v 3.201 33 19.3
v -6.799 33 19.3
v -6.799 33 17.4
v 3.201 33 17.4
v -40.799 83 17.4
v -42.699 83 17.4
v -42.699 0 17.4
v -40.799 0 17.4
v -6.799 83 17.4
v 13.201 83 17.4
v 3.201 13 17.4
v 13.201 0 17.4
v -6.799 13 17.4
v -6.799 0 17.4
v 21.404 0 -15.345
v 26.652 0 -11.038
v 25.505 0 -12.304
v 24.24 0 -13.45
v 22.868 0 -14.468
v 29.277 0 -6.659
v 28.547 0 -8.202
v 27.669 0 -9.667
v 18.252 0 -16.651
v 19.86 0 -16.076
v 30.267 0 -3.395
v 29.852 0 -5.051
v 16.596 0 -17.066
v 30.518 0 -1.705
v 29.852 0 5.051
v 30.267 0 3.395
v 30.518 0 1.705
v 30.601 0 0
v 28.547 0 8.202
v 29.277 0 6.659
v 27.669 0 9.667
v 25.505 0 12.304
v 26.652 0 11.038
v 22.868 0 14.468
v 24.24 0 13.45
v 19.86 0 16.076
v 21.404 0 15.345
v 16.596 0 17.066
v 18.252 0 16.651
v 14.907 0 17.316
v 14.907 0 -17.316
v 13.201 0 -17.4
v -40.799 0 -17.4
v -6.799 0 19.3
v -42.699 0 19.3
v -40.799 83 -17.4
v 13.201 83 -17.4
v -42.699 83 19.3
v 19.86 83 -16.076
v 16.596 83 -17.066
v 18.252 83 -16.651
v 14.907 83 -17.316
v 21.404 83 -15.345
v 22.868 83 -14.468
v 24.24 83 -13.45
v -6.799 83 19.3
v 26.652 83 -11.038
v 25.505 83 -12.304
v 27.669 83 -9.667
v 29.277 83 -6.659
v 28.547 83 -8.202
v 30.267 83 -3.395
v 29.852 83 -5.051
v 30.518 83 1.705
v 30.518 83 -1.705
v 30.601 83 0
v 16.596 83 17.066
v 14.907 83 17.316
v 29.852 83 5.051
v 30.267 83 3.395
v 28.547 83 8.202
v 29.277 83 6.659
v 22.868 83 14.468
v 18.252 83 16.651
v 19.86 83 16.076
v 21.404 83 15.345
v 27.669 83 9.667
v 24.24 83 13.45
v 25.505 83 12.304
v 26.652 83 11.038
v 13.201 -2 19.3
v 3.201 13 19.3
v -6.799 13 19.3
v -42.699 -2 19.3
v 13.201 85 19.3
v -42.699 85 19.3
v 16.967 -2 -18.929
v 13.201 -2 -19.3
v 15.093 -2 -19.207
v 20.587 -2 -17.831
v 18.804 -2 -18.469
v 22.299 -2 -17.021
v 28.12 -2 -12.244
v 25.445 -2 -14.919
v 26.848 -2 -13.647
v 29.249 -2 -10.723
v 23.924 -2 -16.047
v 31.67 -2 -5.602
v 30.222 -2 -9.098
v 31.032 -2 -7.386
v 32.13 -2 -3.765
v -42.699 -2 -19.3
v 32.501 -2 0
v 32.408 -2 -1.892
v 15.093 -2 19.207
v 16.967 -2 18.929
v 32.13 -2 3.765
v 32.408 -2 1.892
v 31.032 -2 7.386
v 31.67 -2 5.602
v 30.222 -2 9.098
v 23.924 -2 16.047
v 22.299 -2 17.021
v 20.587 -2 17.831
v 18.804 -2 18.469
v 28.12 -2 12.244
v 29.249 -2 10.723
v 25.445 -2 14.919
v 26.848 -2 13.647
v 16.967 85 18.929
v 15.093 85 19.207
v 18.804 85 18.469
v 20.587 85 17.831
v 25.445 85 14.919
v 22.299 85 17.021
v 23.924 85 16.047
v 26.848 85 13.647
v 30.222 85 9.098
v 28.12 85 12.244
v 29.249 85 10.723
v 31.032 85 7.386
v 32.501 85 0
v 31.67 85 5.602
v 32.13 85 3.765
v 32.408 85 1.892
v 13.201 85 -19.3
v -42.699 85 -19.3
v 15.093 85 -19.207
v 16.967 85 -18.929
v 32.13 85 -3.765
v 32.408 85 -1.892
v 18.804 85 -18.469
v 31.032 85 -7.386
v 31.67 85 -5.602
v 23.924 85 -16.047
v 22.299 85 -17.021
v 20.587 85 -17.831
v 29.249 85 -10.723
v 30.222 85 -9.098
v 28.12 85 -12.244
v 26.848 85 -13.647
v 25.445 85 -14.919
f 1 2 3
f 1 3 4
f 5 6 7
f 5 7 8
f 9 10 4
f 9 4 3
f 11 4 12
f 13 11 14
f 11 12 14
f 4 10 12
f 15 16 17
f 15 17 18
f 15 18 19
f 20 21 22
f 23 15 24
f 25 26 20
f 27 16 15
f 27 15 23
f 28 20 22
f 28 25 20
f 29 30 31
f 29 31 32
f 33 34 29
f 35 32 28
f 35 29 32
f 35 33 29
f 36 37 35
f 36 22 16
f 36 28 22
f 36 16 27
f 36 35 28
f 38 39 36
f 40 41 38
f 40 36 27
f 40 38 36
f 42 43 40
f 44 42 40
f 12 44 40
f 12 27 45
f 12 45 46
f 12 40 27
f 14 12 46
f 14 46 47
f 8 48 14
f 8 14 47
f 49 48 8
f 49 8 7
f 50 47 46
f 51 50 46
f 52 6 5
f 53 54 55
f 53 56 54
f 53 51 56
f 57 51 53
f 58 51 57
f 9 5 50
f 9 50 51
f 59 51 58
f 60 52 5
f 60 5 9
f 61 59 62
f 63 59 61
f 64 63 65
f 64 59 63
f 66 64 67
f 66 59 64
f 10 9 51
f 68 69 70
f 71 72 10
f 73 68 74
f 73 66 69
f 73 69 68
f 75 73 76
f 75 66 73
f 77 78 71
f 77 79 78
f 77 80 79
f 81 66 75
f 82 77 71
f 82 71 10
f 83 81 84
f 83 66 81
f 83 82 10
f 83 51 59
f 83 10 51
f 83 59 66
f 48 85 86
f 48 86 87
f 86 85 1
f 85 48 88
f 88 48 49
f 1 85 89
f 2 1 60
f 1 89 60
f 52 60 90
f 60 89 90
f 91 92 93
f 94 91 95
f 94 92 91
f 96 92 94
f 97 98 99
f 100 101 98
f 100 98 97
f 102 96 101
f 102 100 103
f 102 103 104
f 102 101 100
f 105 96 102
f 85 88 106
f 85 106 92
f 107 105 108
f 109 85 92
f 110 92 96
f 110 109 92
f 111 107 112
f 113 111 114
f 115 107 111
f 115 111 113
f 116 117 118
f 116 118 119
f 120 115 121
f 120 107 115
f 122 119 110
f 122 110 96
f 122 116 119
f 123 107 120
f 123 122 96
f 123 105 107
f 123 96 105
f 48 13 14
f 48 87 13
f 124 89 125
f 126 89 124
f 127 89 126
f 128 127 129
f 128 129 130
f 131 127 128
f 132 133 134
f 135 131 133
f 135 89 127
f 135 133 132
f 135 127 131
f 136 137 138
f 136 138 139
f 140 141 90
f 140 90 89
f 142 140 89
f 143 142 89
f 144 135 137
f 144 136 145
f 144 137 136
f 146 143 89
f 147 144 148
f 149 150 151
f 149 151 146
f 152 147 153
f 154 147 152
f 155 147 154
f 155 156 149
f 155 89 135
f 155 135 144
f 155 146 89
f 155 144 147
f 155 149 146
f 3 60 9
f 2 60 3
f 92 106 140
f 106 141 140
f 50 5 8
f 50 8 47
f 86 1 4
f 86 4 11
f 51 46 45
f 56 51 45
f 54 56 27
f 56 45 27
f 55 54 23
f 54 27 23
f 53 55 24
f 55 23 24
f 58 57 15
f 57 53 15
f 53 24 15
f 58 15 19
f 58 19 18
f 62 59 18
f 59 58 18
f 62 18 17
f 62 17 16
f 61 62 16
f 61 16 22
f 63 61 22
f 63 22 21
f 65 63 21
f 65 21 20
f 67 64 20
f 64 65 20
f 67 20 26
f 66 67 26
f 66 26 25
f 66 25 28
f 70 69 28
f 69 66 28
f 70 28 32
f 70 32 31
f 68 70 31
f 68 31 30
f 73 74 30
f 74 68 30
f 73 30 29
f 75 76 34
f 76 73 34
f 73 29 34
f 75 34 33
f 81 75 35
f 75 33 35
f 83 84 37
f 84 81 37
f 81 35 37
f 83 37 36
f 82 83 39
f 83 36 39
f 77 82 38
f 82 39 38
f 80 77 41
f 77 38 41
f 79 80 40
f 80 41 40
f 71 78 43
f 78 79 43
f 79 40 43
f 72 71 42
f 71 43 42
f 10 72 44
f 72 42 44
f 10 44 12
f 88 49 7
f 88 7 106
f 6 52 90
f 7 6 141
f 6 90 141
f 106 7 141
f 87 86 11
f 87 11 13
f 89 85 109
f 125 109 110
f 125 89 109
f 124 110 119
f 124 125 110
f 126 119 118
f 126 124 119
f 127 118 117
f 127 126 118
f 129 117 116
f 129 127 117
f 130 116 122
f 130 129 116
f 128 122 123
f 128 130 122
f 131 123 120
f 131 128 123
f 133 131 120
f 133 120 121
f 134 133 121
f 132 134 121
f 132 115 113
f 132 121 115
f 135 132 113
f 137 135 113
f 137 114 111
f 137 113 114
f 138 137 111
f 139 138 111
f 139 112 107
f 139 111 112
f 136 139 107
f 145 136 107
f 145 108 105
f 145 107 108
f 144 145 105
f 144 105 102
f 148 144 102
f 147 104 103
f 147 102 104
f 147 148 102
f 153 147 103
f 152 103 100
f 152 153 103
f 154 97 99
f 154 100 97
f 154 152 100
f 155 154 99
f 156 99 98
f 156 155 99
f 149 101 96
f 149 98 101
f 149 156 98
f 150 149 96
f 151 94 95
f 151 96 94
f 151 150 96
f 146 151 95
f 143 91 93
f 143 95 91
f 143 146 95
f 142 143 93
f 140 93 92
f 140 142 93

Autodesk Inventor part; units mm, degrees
ref_plane "YZ Plane" through (0, 0, 0) normal (1, 0, 0) x (0, 1, 0)
sketch "Sketch1" plane through (0, 0, 0) normal (0, 1, 0) x (-1, 0, 0)
  line L0 (40.7987, 17.4) -> (40.7987, -17.4)
  line L1 (40.7987, -17.4) -> (-13.2013, -17.4)
  arc A0 (-13.2013, 17.4) -> (-13.2013, -17.4) centre (-13.2013, 0) ccw
  line L2 (-13.2013, 17.4) -> (40.7987, 17.4)
  line L3 (42.6987, -19.3) -> (42.6987, 19.3)
  line L4 (42.6987, 19.3) -> (-13.2013, 19.3)
  arc A1 (-13.2013, 19.3) -> (-13.2013, -19.3) centre (-13.2013, 0) ccw
  line L5 (-13.2013, -19.3) -> (42.6987, -19.3)
  point P0 (0, 0)
  point P1 (-13.2013, 0)
  point P2 (0, 0)
  point P3 (-12.8411, -36.7096)
  point P4 (-12.8411, -7.716)
  point P5 (-24.0253, -72.4098)
  dimension "d156" = 1.9
  dimension "d157" = 1.9
  dimension "d158" = 1.9
  dimension "d159" = 1.9
  dimension "d160" = 54
extrude "Extrusion1" add sketch "Sketch1" along normal blind 83
ref_plane "Work Plane1" through (0, 85, 0) normal (0, 1, 0) x (1, 0, 0)
sketch "Sketch2" plane through (0, 85, 0) normal (0, 1, 0) x (1, 0, 0)
  line L0 (-42.6987, 19.3) -> (-42.6987, -19.3)
  line L1 (-42.6987, -19.3) -> (13.2013, -19.3)
  arc A0 (13.2013, -19.3) -> (13.2013, 19.3) centre (13.2013, 0) ccw
  line L2 (13.2013, 19.3) -> (-42.6987, 19.3)
  line L3 (-42.6987, 19.3) -> (-42.6987, -19.3) projected
  line L4 (-42.6987, -19.3) -> (13.2013, -19.3) projected
  arc A1 (13.2013, -19.3) -> (13.2013, 19.3) centre (13.2013, 0) ccw projected
  point P0 (0, 0)
  point P1 (14.0497, 95.3418)
  point P2 (14.0497, 124.3354)
  point P3 (2.8654, 59.6417)
  dimension "d163" = 38.6
  dimension "d165" = 19.3
  dimension "d166" = 0
  dimension "d167" = 0
  dimension "d168" = 0
extrude "Extrusion2" add sketch "Sketch2" against normal up to surface (2 mm away)
ref_plane "Work Plane2" through (-42.6987, 0, 19.3) normal (0, -1, 0) x (1, 0, 0)
sketch "Sketch35" plane through (-42.6987, 0, 19.3) normal (0, -1, 0) x (1, 0, 0)
  line L0 (0, 0) -> (0, -38.6)
  line L1 (0, -38.6) -> (55.9, -38.6)
  arc A0 (55.9, -38.6) -> (55.9, 0) centre (55.9, -19.3) ccw
  line L2 (55.9, 0) -> (0, 0)
  line L3 (0, 0) -> (55.9, 0) projected
  arc A1 (55.9, -38.6) -> (55.9, 0) centre (55.9, -19.3) ccw projected
  line L4 (0, -38.6) -> (0, 0) projected
  point P0 (17.1629, -27.1873)
  point P1 (30.3642, -27.1873)
  point P2 (17.1629, -27.1873)
  point P3 (14.0497, 95.3418)
  point P4 (14.0497, 124.3354)
  point P5 (2.8654, 59.6417)
  dimension "d132" = 19.3
  dimension "d133" = 0
  dimension "d162" = 0
extrude "Extrusion24" add sketch "Sketch35" along normal blind 2
sketch "Sketch37" plane through (-42.6987, 85, 19.3) normal (0, 0, 1) x (1, 0, 0)
  line L0 (35.9, -85) -> (0, -85)
  line L1 (0, -85) -> (0, -2)
  line L2 (0, -2) -> (35.9, -2)
  line L3 (35.9, -2) -> (35.9, -85)
  line L4 (55.9, -85) -> (1.9, -85) projected
  line L5 (55.9, -2) -> (1.9, -2) projected
  line L6 (0, 0) -> (0, -87) projected
  line L7 (55.9, -87) -> (55.9, 0) projected
  point P0 (42.6987, -85)
  dimension "d143" = 0
  dimension "d144" = 0
  dimension "d145" = 0
  dimension "d146" = 20
extrude "Extrusion26" cut sketch "Sketch37" against normal up to surface (1.9 mm away) contours L0 L1 L2 L3
sketch "Sketch38" plane through (-42.6987, 85, 19.3) normal (0, 0, 1) x (1, 0, 0)
  line L0 (35.9, -85) -> (35.9, -2) projected
  line L1 (45.9, -72) -> (35.9, -72)
  line L2 (35.9, -72) -> (35.9, -52)
  line L3 (35.9, -52) -> (45.9, -52)
  line L4 (45.9, -52) -> (45.9, -72)
  line L5 (55.9, -87) -> (0, -87) projected
  point P0 (42.6987, -85)
  point P1 (35.9, -72)
  dimension "d149" = 20
  dimension "d150" = 10
  dimension "d151" = 15
extrude "Extrusion27" cut sketch "Sketch38" against normal up to surface (1.9 mm away)
properties part number "víko"
